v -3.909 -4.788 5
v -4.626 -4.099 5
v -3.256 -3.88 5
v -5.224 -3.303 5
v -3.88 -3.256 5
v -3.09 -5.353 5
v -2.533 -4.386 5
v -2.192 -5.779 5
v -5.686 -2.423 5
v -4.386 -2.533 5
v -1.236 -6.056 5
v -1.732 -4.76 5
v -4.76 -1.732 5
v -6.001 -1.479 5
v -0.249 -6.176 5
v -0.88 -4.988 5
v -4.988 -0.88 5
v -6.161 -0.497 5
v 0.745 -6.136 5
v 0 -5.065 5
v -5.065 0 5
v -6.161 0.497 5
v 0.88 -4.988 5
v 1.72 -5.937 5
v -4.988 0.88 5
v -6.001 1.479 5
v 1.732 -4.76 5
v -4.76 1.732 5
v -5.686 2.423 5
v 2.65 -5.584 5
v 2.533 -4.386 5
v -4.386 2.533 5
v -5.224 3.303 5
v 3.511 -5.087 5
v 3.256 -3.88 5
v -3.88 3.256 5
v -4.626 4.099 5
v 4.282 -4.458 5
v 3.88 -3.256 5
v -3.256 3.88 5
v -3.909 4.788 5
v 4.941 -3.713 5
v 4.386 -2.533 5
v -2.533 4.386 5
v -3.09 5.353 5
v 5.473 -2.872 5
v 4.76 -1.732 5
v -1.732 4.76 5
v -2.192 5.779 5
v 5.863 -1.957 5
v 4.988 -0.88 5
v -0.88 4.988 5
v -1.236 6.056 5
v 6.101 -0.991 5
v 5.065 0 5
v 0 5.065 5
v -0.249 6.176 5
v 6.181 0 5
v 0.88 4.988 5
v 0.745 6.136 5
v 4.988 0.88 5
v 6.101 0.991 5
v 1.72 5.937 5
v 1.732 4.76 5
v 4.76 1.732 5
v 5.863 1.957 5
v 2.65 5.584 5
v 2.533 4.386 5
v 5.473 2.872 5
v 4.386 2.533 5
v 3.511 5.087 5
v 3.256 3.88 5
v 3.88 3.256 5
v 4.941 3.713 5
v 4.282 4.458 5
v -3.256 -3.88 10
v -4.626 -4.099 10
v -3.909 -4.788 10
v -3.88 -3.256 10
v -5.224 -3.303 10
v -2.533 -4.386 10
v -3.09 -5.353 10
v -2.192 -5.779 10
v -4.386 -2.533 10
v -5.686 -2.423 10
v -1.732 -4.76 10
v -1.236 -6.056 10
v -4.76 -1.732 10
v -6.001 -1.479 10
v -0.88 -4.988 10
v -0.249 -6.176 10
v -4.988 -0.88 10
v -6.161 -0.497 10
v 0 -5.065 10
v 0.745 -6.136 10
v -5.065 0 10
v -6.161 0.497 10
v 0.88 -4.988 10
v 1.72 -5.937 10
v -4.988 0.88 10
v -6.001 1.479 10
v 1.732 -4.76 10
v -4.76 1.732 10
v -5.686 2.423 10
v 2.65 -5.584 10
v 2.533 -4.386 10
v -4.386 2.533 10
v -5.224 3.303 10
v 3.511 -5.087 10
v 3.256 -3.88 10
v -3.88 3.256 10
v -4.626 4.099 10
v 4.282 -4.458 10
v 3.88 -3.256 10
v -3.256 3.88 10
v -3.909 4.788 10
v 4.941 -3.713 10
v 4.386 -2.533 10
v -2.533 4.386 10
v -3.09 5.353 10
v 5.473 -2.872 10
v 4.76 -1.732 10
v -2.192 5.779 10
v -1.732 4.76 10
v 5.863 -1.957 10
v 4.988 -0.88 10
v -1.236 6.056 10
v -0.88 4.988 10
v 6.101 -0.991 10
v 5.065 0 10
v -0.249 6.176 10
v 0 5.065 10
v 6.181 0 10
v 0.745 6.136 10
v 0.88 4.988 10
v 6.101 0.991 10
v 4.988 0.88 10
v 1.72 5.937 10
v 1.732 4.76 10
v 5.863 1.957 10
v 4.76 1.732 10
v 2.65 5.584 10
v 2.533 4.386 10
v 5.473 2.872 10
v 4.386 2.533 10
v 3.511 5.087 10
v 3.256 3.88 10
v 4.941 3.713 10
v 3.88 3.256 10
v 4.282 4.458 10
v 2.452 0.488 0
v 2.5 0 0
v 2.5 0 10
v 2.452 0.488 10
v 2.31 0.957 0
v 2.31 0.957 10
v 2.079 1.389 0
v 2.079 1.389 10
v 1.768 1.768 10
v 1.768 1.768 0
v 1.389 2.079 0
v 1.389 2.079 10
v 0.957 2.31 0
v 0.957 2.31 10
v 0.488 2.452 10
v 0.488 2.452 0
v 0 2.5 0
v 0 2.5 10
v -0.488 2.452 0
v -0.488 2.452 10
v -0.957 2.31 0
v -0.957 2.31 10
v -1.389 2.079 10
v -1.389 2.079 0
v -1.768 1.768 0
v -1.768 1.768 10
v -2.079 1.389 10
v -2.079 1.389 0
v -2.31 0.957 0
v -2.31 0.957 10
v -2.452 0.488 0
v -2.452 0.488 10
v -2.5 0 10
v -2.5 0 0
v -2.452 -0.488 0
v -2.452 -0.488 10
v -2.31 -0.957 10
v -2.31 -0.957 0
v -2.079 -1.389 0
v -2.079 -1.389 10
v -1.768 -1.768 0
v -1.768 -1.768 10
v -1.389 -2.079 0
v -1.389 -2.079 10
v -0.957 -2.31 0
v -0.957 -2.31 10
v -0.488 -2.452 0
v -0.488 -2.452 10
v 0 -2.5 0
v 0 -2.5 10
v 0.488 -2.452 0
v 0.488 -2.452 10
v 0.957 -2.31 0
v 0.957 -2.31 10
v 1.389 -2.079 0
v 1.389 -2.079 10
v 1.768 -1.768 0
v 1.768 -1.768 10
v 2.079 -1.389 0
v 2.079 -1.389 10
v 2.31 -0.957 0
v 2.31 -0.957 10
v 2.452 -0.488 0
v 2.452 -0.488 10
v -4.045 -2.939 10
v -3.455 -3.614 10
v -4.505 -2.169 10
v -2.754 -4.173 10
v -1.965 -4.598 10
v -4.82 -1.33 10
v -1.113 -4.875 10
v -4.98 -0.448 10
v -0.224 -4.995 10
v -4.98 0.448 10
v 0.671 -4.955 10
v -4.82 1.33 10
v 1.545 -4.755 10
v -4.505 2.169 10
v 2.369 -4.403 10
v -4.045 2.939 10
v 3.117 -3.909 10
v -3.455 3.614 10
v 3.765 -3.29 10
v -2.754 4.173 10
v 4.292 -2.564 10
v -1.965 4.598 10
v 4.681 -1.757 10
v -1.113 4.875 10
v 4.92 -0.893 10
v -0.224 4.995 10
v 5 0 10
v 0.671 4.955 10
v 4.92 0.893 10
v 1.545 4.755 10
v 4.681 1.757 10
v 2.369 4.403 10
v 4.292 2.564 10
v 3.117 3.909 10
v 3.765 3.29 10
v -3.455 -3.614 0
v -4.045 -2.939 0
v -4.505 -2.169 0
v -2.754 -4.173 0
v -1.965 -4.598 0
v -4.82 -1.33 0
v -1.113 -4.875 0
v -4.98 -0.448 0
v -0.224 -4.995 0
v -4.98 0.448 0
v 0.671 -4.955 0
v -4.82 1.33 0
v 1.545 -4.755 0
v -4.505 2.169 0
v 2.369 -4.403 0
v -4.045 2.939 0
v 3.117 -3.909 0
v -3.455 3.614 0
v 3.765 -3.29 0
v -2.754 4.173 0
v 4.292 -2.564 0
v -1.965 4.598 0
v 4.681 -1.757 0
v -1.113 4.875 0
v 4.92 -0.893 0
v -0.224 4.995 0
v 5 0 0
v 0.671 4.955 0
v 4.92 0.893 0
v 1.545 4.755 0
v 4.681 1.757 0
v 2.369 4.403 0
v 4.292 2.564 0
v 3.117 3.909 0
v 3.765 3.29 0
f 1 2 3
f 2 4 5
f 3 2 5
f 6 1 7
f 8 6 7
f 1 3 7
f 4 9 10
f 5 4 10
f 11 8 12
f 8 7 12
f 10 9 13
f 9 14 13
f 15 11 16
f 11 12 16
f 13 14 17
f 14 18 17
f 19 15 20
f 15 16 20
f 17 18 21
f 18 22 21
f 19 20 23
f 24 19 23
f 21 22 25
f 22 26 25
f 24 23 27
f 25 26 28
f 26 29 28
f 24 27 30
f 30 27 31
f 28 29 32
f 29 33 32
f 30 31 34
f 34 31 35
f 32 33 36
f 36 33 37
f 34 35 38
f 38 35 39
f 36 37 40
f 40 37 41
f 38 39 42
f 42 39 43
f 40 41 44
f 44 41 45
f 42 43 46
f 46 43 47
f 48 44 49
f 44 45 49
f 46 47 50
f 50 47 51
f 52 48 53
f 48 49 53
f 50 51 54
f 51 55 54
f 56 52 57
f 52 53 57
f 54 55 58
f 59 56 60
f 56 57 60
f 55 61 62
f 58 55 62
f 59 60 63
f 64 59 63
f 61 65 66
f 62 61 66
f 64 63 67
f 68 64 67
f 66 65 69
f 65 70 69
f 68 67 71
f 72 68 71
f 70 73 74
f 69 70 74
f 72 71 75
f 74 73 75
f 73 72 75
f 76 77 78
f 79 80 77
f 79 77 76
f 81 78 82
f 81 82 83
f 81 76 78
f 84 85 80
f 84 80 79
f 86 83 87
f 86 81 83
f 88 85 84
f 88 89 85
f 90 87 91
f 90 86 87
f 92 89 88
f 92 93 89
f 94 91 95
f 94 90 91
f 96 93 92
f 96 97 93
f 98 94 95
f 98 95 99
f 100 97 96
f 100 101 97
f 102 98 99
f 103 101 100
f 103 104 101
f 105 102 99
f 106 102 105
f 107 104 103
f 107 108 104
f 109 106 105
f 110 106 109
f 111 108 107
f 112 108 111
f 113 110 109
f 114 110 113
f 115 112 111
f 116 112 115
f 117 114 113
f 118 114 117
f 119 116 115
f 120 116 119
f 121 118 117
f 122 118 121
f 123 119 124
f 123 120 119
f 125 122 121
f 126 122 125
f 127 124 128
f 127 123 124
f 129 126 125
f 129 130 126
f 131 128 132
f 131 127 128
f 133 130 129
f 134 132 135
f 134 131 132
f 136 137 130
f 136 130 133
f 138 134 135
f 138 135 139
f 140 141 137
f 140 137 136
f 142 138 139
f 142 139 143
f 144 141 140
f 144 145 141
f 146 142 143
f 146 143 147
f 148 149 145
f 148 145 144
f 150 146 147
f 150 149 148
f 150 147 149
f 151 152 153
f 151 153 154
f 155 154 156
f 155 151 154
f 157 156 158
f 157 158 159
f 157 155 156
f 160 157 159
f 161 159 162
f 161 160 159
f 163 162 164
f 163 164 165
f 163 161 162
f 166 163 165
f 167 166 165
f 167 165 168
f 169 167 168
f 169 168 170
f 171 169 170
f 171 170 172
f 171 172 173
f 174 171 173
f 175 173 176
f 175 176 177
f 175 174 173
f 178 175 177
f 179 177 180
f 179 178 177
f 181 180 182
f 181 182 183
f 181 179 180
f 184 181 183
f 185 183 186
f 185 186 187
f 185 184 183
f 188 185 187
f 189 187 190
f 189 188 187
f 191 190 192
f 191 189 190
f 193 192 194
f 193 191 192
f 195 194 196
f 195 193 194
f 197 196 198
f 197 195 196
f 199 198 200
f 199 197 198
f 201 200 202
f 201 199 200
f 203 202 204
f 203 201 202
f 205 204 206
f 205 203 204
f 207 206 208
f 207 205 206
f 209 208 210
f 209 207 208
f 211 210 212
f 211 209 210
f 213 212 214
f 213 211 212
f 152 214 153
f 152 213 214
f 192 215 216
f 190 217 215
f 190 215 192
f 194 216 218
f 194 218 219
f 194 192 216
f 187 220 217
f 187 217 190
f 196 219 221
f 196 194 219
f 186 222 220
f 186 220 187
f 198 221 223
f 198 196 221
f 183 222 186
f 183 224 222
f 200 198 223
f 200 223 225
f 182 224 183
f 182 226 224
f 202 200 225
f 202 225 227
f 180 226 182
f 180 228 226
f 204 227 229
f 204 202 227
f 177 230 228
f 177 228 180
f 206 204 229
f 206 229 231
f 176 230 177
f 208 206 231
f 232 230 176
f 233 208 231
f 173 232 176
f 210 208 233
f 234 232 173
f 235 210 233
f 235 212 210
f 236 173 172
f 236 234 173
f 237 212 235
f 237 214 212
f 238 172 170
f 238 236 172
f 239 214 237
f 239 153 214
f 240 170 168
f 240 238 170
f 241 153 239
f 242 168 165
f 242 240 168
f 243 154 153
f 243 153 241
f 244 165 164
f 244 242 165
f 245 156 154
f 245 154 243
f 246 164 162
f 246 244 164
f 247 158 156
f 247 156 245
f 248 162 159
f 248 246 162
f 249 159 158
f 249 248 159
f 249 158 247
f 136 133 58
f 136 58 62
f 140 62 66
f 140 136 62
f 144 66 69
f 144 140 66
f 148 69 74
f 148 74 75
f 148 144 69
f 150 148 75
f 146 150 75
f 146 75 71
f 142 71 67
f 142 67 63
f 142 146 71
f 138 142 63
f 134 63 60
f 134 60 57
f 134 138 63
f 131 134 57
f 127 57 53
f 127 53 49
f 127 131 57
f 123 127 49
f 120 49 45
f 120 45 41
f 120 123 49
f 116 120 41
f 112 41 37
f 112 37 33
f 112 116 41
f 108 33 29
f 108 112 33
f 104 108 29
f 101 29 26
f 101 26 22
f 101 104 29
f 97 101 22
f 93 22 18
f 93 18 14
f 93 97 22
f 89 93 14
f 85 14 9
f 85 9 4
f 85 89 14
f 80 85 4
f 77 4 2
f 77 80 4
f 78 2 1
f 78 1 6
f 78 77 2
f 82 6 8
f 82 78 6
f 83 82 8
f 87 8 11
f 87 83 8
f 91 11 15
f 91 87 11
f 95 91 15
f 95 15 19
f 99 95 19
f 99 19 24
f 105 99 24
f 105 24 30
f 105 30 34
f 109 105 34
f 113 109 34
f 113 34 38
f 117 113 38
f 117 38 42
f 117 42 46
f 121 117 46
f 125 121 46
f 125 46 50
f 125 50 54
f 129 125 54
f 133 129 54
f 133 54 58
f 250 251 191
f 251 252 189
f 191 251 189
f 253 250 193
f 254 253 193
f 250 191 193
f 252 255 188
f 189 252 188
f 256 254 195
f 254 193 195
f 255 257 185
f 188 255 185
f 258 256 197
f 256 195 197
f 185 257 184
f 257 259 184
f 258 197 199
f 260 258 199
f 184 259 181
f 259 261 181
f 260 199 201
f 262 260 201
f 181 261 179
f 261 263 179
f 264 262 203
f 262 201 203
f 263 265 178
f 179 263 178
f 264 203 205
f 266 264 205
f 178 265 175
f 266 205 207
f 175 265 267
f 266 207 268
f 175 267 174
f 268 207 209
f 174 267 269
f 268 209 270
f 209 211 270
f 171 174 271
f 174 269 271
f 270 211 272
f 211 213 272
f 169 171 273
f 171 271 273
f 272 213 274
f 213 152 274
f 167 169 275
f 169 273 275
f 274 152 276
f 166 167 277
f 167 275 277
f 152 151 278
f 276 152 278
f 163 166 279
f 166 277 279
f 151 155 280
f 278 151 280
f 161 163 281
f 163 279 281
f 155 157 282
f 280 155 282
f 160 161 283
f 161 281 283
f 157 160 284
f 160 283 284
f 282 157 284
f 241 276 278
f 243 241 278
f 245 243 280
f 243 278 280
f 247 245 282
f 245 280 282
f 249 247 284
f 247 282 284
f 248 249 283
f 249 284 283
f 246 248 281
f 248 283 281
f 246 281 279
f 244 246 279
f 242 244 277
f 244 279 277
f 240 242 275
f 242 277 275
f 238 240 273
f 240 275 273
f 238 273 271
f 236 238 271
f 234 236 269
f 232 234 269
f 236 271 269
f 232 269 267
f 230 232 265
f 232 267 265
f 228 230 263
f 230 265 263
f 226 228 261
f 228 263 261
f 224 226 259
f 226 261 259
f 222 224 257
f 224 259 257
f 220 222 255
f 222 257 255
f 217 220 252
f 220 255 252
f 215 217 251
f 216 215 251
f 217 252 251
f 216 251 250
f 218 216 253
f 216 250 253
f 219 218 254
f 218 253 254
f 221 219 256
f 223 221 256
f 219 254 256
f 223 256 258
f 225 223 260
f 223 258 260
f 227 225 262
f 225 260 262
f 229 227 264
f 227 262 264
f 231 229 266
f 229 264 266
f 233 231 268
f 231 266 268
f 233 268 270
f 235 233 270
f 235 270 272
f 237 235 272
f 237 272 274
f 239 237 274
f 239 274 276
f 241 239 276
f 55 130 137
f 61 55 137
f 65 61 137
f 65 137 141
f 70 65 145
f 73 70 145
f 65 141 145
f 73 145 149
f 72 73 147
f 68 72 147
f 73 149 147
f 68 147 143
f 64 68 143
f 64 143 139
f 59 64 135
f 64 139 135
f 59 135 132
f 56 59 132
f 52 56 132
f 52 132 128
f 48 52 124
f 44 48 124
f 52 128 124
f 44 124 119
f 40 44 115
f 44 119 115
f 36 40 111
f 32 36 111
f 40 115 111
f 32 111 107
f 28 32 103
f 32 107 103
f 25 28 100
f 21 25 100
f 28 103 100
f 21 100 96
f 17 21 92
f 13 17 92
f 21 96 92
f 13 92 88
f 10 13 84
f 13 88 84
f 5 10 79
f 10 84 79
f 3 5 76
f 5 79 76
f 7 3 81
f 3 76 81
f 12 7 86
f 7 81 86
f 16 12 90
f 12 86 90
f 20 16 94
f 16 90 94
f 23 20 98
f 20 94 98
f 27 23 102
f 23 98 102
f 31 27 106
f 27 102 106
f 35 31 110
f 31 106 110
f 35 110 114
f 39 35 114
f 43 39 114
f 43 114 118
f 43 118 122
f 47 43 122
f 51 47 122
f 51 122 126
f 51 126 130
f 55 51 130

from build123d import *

# Parameters (mm, degrees)
F0_R     = 5
F0_R_2   = 2.5
F1_DEPTH = 10
F2_R     = 6.180805
F2_R_2   = 5.065053
F3_DEPTH = 5


with BuildPart() as f1:
    # F0 (on Top) → F1 (new body)
    with BuildSketch(Plane.XY):
        Circle(F0_R)
        Circle(F0_R_2, mode=Mode.SUBTRACT)
    extrude(amount=F1_DEPTH)


with BuildPart() as f3:
    # F2 (on face) → F3 (new body)
    with BuildSketch(Plane.XY.offset(10)):
        Circle(F2_R)
        Circle(F2_R_2, mode=Mode.SUBTRACT)
    extrude(amount=-F3_DEPTH)


solid = Compound([f1.part, f3.part])
